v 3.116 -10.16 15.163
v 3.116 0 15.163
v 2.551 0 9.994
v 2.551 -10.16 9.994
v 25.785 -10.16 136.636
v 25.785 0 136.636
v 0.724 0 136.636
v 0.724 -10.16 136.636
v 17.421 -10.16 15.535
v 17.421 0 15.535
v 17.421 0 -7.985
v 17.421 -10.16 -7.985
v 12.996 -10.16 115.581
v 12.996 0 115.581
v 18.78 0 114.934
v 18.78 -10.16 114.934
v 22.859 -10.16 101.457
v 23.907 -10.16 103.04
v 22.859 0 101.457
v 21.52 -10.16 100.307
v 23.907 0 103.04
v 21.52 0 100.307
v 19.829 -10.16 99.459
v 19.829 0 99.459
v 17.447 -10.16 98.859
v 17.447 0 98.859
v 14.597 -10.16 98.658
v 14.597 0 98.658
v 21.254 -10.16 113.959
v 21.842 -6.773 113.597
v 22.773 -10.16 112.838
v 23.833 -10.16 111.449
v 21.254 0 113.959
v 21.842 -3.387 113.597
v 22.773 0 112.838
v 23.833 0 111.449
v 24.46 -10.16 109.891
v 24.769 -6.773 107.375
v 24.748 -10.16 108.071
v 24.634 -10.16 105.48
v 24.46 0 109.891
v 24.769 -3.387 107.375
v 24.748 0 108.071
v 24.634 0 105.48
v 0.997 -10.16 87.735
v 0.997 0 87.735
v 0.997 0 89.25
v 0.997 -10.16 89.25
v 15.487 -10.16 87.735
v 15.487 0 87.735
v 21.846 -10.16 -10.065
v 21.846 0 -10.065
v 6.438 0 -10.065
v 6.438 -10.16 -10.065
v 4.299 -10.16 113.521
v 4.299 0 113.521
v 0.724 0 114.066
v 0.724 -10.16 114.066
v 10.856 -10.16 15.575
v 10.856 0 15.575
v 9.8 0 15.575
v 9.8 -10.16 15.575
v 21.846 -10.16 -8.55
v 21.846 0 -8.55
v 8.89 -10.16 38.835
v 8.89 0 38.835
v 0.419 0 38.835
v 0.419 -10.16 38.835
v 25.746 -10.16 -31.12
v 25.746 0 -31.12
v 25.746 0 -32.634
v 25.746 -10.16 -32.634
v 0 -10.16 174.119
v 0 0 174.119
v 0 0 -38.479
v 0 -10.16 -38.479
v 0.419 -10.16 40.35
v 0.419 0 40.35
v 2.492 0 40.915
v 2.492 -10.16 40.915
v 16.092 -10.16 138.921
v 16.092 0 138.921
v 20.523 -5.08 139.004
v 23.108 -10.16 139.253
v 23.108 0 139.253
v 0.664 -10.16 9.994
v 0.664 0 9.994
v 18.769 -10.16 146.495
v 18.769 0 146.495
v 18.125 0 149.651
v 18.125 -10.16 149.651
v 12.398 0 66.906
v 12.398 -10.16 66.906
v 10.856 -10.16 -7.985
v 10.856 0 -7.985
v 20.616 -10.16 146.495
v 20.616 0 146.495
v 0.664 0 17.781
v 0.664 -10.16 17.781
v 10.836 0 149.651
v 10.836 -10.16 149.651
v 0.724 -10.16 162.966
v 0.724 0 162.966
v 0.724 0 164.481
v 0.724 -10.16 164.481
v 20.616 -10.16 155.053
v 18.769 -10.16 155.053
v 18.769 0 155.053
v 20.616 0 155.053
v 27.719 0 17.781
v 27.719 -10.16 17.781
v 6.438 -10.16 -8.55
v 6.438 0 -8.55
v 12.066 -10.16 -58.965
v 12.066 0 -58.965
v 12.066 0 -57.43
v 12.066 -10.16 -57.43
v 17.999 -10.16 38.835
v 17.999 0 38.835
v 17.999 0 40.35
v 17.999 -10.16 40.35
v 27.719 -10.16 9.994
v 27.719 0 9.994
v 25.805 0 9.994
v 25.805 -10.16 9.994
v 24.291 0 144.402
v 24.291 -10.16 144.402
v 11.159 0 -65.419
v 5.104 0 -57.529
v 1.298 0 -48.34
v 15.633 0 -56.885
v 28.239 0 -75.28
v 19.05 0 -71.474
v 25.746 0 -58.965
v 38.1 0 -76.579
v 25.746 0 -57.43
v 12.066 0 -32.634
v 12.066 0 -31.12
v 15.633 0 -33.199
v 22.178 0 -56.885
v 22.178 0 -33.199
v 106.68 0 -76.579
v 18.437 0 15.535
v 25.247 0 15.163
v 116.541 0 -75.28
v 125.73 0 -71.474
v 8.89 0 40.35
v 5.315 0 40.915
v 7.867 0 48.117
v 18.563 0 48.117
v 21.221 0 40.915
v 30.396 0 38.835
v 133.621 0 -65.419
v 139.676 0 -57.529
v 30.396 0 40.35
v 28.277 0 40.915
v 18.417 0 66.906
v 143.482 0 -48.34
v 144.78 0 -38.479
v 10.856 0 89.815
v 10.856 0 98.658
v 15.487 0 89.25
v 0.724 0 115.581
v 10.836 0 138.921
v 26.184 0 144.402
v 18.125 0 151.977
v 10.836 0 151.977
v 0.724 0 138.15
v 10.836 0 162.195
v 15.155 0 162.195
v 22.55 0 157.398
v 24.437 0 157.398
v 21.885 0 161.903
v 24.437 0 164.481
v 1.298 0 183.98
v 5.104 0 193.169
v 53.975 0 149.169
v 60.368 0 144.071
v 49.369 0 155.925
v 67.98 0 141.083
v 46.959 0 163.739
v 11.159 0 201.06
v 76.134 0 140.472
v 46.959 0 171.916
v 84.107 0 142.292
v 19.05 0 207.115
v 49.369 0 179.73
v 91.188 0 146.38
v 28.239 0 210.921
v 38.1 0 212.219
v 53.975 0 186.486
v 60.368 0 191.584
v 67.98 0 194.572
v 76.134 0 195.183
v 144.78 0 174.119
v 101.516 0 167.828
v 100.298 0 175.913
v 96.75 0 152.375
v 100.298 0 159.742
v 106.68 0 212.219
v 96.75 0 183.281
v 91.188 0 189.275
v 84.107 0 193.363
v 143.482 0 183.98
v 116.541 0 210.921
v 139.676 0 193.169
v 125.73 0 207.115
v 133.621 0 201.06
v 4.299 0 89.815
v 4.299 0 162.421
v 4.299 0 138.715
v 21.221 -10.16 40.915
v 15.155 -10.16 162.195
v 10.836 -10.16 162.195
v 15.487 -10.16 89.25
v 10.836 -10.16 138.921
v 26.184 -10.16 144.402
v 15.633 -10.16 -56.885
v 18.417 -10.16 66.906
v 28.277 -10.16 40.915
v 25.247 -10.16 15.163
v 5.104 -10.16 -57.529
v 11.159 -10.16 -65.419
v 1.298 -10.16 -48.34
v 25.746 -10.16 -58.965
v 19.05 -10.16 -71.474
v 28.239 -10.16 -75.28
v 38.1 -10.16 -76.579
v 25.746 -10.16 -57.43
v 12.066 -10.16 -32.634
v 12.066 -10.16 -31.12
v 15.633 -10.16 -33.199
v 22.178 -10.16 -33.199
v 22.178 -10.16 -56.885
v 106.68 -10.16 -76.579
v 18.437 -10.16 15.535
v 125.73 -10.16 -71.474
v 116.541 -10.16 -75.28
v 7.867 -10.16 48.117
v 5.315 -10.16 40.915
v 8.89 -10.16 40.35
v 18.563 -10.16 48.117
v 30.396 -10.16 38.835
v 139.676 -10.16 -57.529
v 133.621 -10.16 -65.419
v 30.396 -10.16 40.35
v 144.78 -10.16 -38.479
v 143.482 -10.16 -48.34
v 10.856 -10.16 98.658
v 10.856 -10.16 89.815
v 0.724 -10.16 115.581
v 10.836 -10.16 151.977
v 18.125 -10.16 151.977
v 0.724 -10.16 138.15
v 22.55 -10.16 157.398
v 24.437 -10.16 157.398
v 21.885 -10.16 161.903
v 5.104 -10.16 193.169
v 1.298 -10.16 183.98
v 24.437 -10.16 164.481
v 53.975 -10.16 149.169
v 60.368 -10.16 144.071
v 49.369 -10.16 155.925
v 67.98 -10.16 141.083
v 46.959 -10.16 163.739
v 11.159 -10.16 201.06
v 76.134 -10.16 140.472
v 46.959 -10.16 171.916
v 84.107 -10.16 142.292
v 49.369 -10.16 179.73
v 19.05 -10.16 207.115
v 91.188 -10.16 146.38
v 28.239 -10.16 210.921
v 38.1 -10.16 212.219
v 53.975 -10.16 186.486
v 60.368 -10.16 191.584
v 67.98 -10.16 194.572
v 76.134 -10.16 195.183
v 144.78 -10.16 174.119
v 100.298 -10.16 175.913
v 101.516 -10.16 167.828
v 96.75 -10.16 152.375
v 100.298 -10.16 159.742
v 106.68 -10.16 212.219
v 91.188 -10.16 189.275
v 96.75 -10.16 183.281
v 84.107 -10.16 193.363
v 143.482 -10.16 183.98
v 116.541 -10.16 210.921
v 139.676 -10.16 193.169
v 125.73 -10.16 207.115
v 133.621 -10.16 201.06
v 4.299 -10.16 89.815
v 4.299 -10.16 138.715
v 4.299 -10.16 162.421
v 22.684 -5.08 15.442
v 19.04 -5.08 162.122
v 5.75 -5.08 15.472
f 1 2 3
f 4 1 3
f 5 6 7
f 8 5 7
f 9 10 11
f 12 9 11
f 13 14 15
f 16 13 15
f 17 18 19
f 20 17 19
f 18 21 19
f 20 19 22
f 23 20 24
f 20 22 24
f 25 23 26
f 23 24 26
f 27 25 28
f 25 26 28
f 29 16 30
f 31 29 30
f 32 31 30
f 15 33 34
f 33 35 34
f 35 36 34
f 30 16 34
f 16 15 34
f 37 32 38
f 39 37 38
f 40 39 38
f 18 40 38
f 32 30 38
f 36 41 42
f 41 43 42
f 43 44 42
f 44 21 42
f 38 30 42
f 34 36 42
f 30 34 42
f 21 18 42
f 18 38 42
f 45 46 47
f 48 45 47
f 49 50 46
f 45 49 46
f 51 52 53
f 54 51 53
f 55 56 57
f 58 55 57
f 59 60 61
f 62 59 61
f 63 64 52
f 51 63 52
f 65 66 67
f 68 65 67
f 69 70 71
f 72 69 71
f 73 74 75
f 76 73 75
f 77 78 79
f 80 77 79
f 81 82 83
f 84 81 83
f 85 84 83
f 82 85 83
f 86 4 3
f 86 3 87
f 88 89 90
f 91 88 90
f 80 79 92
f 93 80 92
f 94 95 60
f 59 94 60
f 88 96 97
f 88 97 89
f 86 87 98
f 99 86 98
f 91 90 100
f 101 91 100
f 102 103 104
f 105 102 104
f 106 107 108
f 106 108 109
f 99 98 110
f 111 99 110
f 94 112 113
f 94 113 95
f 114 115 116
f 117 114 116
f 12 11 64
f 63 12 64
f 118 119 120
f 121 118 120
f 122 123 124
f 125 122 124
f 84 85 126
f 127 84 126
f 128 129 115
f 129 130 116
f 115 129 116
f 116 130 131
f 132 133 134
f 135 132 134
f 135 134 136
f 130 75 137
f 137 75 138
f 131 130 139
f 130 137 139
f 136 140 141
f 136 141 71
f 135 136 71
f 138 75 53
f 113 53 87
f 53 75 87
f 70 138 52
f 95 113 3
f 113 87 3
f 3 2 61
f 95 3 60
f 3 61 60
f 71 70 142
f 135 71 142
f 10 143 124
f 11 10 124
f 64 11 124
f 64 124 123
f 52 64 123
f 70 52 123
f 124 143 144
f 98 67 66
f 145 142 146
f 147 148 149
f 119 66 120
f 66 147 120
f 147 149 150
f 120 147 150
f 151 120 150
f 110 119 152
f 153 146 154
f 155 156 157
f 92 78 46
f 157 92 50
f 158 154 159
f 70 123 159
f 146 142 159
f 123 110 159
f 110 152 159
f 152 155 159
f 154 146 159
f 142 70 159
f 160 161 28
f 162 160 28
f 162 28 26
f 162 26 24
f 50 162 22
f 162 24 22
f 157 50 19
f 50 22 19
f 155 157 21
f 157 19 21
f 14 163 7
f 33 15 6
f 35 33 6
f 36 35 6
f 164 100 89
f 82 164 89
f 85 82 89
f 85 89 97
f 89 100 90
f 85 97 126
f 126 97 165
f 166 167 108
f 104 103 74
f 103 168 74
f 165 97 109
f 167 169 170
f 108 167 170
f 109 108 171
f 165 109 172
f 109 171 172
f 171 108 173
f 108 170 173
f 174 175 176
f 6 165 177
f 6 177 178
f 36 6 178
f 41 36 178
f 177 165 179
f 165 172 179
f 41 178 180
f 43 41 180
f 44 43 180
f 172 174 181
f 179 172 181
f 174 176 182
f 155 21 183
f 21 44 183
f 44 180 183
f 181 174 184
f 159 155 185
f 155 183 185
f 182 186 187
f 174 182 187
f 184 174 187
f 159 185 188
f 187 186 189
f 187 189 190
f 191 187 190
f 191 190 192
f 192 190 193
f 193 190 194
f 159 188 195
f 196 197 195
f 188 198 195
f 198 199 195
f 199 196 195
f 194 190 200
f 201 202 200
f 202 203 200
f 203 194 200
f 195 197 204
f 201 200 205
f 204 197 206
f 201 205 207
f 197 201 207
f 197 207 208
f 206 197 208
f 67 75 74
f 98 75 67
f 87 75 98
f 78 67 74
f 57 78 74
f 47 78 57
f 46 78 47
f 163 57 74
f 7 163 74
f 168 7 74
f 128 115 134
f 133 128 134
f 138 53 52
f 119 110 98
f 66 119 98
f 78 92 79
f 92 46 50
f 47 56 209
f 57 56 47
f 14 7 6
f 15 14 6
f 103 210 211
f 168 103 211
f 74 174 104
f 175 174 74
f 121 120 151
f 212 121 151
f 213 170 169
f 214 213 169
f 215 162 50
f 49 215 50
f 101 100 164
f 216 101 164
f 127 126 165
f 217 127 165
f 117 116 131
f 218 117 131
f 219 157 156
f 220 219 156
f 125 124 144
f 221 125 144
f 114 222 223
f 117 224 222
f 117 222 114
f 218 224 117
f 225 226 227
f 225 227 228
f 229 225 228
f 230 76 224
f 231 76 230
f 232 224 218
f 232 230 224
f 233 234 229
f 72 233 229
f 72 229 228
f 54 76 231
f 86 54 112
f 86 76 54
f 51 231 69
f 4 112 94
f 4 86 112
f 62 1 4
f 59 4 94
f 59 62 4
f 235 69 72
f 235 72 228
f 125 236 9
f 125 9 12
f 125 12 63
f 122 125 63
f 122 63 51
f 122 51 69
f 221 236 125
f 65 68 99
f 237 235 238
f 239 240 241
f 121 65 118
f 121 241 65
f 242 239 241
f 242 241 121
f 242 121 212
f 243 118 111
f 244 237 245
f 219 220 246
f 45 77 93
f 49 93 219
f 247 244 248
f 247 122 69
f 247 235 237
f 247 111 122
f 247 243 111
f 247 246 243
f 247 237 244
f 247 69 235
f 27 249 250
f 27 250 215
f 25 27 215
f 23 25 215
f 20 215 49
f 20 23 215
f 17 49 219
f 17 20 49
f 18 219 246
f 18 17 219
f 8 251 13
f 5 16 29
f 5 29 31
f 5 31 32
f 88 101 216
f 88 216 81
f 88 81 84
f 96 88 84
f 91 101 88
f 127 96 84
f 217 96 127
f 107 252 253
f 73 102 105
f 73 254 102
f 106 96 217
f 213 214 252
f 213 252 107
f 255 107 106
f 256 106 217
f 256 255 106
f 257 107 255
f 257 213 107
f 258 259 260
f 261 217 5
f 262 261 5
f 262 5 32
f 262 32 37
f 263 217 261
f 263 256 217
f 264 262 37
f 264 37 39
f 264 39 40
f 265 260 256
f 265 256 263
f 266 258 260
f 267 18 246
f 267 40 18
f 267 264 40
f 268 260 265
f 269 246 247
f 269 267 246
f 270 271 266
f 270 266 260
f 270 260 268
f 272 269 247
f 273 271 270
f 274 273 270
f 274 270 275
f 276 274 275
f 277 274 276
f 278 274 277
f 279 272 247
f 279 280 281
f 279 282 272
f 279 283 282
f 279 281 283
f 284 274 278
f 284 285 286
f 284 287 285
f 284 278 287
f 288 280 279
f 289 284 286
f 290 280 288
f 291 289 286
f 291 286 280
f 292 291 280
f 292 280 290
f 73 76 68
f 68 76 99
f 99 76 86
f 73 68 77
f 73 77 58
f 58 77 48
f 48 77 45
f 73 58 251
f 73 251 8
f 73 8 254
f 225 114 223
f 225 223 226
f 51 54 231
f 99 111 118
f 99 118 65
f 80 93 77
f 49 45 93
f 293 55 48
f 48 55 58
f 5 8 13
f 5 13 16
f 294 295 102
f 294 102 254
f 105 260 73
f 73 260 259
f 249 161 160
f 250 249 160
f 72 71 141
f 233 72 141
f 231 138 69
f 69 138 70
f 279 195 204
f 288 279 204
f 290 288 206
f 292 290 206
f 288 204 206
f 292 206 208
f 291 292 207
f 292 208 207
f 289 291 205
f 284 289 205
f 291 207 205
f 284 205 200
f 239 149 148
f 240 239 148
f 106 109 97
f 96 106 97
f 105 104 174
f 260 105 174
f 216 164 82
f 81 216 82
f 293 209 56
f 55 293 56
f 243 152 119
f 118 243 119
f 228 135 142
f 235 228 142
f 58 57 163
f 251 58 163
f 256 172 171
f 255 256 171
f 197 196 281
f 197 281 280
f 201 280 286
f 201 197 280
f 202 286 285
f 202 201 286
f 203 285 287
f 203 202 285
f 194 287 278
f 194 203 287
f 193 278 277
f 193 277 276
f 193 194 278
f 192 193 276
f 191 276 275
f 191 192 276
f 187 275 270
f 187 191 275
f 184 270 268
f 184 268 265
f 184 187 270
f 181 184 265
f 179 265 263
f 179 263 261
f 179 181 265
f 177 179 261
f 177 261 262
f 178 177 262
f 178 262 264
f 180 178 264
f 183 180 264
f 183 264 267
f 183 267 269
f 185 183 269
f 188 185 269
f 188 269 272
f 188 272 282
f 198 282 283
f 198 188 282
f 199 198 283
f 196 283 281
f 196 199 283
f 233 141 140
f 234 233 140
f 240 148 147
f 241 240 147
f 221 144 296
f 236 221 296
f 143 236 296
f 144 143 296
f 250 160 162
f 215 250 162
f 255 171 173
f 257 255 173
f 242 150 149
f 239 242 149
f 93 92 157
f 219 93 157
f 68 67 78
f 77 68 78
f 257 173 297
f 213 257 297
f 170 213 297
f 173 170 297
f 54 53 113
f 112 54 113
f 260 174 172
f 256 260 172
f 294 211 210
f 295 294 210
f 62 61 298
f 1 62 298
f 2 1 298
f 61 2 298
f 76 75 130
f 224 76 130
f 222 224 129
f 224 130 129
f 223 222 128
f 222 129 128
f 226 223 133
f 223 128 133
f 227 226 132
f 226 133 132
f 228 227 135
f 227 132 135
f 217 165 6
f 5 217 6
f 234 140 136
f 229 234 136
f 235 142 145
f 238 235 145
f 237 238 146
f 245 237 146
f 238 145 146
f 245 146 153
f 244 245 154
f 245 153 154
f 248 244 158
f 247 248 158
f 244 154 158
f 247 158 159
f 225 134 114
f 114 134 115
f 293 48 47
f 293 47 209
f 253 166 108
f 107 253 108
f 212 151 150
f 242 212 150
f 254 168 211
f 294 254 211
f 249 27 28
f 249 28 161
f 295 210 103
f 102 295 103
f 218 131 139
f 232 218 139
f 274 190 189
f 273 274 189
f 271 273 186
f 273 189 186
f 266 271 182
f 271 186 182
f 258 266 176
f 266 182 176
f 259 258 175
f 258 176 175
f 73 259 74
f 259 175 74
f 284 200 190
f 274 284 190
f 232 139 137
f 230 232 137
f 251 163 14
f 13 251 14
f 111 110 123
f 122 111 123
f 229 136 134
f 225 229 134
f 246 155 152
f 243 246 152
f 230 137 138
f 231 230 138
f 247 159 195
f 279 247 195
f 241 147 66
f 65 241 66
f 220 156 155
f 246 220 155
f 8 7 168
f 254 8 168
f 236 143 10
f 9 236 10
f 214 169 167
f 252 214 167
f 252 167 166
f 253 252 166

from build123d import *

# Parameters (mm, degrees)
F0_R     = 27.432
F1_DEPTH = 10.16


with BuildPart() as f1:
    # F0 (on Front) → F1 (new body)
    with BuildSketch(Plane.XZ):
        with BuildLine():
            ThreePointArc((0, -38.4786100226), (11.1592316368, -65.4193783858), (38.1, -76.5786100226))
            Line((38.1, -76.5786100226), (106.68, -76.5786100226))
            ThreePointArc((106.68, -76.5786100226), (133.6207683632, -65.4193783858), (144.78, -38.4786100226))
            Line((144.78, -38.4786100226), (144.78, 174.1193899774))
            ThreePointArc((144.78, 174.1193899774), (133.6207683632, 201.0601583406), (106.68, 212.2193899774))
            Line((106.68, 212.2193899774), (38.1, 212.2193899774))
            ThreePointArc((38.1, 212.2193899774), (11.1592316368, 201.0601583406), (0, 174.1193899774))
            Line((0, 174.1193899774), (0, -38.4786100226))
        make_face()
        Polygon((22.1777712578, -33.1991309873), (22.1777712578, -56.8850969951), (25.7456152258, -57.4299074334), (25.7456152258, -58.9646783023), (12.065558, -58.9646783023), (12.065558, -57.4299074334), (15.6334019681, -56.8850969951), (15.6334019681, -33.1991309873), (12.065558, -32.6343884598), (12.065558, -31.11954968), (25.7456152258, -31.11954968), (25.7456152258, -32.6343884598), align=None, mode=Mode.SUBTRACT)
        with BuildLine():
            Line((21.845569771, -10.0646194476), (6.4380648139, -10.0646194476))
            Line((6.4380648139, -10.0646194476), (6.4380648139, -8.5497806678))
            Line((6.4380648139, -8.5497806678), (10.8563445881, -7.9850381403))
            Line((10.8563445881, -7.9850381403), (10.8563445881, 15.5746913025))
            Line((10.8563445881, 15.5746913025), (9.7999438602, 15.5746913025))
            add(Edge.make_bspline(
                [(9.7999438602, 15.5746913025), (5.0428185694, 15.5746913025), (3.116049946, 15.1627614589)],
                knots=[0, 0, 0, 1, 1, 1], degree=2))
            Line((3.116049946, 15.1627614589), (2.5513074185, 9.9937063245))
            Line((2.5513074185, 9.9937063245), (0.6644029736, 9.9937063245))
            Line((0.6644029736, 9.9937063245), (0.6644029736, 17.7805091747))
            Line((0.6644029736, 17.7805091747), (27.7188920573, 17.7805091747))
            Line((27.7188920573, 17.7805091747), (27.7188920573, 9.9937063245))
            Line((27.7188920573, 9.9937063245), (25.8054114935, 9.9937063245))
            Line((25.8054114935, 9.9937063245), (25.2473129957, 15.1627614589))
            add(Edge.make_bspline(
                [(25.2473129957, 15.1627614589), (23.5265092941, 15.5348271241), (18.4371825166, 15.5348271241)],
                knots=[0, 0, 0, 1, 1, 1], degree=2))
            Line((18.4371825166, 15.5348271241), (17.420645967, 15.5348271241))
            Line((17.420645967, 15.5348271241), (17.420645967, -7.9850381403))
            Line((17.420645967, -7.9850381403), (21.845569771, -8.5497806678))
            Line((21.845569771, -8.5497806678), (21.845569771, -10.0646194476))
        make_face(mode=Mode.SUBTRACT)
        Polygon((5.3152237886, 40.9150207144), (8.8897117864, 40.3502781869), (8.8897117864, 38.8354394072), (0.4185738733, 38.8354394072), (0.4185738733, 40.3502781869), (2.4915111509, 40.9150207144), (12.3977594868, 66.9064650405), (18.4172504274, 66.9064650405), (28.2769905551, 40.9150207144), (30.3964360408, 40.3502781869), (30.3964360408, 38.8354394072), (17.998676554, 38.8354394072), (17.998676554, 40.3502781869), (21.2210309758, 40.9150207144), (18.5634190815, 48.1171489479), (7.8665312071, 48.1171489479), align=None, mode=Mode.SUBTRACT)
        with BuildLine():
            Line((14.5969333293, 98.6582831474), (10.8563445881, 98.6582831474))
            Line((10.8563445881, 98.6582831474), (10.8563445881, 89.8150795692))
            Line((10.8563445881, 89.8150795692), (15.4872333139, 89.2503370416))
            Line((15.4872333139, 89.2503370416), (15.4872333139, 87.7354982619))
            Line((15.4872333139, 87.7354982619), (0.9966044604, 87.7354982619))
            Line((0.9966044604, 87.7354982619), (0.9966044604, 89.2503370416))
            Line((0.9966044604, 89.2503370416), (4.298687239, 89.8150795692))
            Line((4.298687239, 89.8150795692), (4.298687239, 113.5209776661))
            Line((4.298687239, 113.5209776661), (0.7241992412, 114.0657881045))
            Line((0.7241992412, 114.0657881045), (0.7241992412, 115.5806268842))
            Line((0.7241992412, 115.5806268842), (12.995722163, 115.5806268842))
            add(Edge.make_bspline(
                [(12.995722163, 115.5806268842), (18.9155526575, 115.5806268842), (21.8422477561, 113.5973840081)],
                knots=[0, 0, 0, 1, 1, 1], degree=2))
            add(Edge.make_bspline(
                [(21.8422477561, 113.5973840081), (24.7689428547, 111.614141132), (24.7689428547, 107.3752501606)],
                knots=[0, 0, 0, 1, 1, 1], degree=2))
            add(Edge.make_bspline(
                [(24.7689428547, 107.3752501606), (24.7689428547, 98.6582831474), (14.5969333293, 98.6582831474)],
                knots=[0, 0, 0, 1, 1, 1], degree=2))
        make_face(mode=Mode.SUBTRACT)
        with BuildLine():
            Line((0.7241992412, 136.6355571166), (0.7241992412, 138.1503958964))
            Line((0.7241992412, 138.1503958964), (4.298687239, 138.7151384239))
            Line((4.298687239, 138.7151384239), (4.298687239, 162.4210365209))
            Line((4.298687239, 162.4210365209), (0.7241992412, 162.9658469592))
            Line((0.7241992412, 162.9658469592), (0.7241992412, 164.4806857389))
            Line((0.7241992412, 164.4806857389), (24.4367413679, 164.4806857389))
            Line((24.4367413679, 164.4806857389), (24.4367413679, 157.3981500407))
            Line((24.4367413679, 157.3981500407), (22.549836923, 157.3981500407))
            Line((22.549836923, 157.3981500407), (21.8854339494, 161.9028022015))
            add(Edge.make_bspline(
                [(21.8854339494, 161.9028022015), (19.5600235419, 162.1951395099), (15.1550318271, 162.1951395099)],
                knots=[0, 0, 0, 1, 1, 1], degree=2))
            Line((15.1550318271, 162.1951395099), (10.8364124989, 162.1951395099))
            Line((10.8364124989, 162.1951395099), (10.8364124989, 151.9766217764))
            Line((10.8364124989, 151.9766217764), (18.124913119, 151.9766217764))
            Line((18.124913119, 151.9766217764), (18.7693840033, 155.052807544))
            Line((18.7693840033, 155.052807544), (20.6164242699, 155.052807544))
            Line((20.6164242699, 155.052807544), (20.6164242699, 146.4952972444))
            Line((20.6164242699, 146.4952972444), (18.7693840033, 146.4952972444))
            Line((18.7693840033, 146.4952972444), (18.124913119, 149.6512113689))
            Line((18.124913119, 149.6512113689), (10.8364124989, 149.6512113689))
            Line((10.8364124989, 149.6512113689), (10.8364124989, 138.9211033457))
            Line((10.8364124989, 138.9211033457), (16.0918400199, 138.9211033457))
            add(Edge.make_bspline(
                [(16.0918400199, 138.9211033457), (21.4469279868, 138.9211033457), (23.1079354208, 139.2533048325)],
                knots=[0, 0, 0, 1, 1, 1], degree=2))
            Line((23.1079354208, 139.2533048325), (24.2905727137, 144.4024278777))
            Line((24.2905727137, 144.4024278777), (26.1841211884, 144.4024278777))
            Line((26.1841211884, 144.4024278777), (25.7854794042, 136.6355571166))
            Line((25.7854794042, 136.6355571166), (0.7241992412, 136.6355571166))
        make_face(mode=Mode.SUBTRACT)
        with Locations((74.0844953617, 167.8276180772)):
            Circle(F0_R, mode=Mode.SUBTRACT)
    extrude(amount=F1_DEPTH)


solid = f1.part
